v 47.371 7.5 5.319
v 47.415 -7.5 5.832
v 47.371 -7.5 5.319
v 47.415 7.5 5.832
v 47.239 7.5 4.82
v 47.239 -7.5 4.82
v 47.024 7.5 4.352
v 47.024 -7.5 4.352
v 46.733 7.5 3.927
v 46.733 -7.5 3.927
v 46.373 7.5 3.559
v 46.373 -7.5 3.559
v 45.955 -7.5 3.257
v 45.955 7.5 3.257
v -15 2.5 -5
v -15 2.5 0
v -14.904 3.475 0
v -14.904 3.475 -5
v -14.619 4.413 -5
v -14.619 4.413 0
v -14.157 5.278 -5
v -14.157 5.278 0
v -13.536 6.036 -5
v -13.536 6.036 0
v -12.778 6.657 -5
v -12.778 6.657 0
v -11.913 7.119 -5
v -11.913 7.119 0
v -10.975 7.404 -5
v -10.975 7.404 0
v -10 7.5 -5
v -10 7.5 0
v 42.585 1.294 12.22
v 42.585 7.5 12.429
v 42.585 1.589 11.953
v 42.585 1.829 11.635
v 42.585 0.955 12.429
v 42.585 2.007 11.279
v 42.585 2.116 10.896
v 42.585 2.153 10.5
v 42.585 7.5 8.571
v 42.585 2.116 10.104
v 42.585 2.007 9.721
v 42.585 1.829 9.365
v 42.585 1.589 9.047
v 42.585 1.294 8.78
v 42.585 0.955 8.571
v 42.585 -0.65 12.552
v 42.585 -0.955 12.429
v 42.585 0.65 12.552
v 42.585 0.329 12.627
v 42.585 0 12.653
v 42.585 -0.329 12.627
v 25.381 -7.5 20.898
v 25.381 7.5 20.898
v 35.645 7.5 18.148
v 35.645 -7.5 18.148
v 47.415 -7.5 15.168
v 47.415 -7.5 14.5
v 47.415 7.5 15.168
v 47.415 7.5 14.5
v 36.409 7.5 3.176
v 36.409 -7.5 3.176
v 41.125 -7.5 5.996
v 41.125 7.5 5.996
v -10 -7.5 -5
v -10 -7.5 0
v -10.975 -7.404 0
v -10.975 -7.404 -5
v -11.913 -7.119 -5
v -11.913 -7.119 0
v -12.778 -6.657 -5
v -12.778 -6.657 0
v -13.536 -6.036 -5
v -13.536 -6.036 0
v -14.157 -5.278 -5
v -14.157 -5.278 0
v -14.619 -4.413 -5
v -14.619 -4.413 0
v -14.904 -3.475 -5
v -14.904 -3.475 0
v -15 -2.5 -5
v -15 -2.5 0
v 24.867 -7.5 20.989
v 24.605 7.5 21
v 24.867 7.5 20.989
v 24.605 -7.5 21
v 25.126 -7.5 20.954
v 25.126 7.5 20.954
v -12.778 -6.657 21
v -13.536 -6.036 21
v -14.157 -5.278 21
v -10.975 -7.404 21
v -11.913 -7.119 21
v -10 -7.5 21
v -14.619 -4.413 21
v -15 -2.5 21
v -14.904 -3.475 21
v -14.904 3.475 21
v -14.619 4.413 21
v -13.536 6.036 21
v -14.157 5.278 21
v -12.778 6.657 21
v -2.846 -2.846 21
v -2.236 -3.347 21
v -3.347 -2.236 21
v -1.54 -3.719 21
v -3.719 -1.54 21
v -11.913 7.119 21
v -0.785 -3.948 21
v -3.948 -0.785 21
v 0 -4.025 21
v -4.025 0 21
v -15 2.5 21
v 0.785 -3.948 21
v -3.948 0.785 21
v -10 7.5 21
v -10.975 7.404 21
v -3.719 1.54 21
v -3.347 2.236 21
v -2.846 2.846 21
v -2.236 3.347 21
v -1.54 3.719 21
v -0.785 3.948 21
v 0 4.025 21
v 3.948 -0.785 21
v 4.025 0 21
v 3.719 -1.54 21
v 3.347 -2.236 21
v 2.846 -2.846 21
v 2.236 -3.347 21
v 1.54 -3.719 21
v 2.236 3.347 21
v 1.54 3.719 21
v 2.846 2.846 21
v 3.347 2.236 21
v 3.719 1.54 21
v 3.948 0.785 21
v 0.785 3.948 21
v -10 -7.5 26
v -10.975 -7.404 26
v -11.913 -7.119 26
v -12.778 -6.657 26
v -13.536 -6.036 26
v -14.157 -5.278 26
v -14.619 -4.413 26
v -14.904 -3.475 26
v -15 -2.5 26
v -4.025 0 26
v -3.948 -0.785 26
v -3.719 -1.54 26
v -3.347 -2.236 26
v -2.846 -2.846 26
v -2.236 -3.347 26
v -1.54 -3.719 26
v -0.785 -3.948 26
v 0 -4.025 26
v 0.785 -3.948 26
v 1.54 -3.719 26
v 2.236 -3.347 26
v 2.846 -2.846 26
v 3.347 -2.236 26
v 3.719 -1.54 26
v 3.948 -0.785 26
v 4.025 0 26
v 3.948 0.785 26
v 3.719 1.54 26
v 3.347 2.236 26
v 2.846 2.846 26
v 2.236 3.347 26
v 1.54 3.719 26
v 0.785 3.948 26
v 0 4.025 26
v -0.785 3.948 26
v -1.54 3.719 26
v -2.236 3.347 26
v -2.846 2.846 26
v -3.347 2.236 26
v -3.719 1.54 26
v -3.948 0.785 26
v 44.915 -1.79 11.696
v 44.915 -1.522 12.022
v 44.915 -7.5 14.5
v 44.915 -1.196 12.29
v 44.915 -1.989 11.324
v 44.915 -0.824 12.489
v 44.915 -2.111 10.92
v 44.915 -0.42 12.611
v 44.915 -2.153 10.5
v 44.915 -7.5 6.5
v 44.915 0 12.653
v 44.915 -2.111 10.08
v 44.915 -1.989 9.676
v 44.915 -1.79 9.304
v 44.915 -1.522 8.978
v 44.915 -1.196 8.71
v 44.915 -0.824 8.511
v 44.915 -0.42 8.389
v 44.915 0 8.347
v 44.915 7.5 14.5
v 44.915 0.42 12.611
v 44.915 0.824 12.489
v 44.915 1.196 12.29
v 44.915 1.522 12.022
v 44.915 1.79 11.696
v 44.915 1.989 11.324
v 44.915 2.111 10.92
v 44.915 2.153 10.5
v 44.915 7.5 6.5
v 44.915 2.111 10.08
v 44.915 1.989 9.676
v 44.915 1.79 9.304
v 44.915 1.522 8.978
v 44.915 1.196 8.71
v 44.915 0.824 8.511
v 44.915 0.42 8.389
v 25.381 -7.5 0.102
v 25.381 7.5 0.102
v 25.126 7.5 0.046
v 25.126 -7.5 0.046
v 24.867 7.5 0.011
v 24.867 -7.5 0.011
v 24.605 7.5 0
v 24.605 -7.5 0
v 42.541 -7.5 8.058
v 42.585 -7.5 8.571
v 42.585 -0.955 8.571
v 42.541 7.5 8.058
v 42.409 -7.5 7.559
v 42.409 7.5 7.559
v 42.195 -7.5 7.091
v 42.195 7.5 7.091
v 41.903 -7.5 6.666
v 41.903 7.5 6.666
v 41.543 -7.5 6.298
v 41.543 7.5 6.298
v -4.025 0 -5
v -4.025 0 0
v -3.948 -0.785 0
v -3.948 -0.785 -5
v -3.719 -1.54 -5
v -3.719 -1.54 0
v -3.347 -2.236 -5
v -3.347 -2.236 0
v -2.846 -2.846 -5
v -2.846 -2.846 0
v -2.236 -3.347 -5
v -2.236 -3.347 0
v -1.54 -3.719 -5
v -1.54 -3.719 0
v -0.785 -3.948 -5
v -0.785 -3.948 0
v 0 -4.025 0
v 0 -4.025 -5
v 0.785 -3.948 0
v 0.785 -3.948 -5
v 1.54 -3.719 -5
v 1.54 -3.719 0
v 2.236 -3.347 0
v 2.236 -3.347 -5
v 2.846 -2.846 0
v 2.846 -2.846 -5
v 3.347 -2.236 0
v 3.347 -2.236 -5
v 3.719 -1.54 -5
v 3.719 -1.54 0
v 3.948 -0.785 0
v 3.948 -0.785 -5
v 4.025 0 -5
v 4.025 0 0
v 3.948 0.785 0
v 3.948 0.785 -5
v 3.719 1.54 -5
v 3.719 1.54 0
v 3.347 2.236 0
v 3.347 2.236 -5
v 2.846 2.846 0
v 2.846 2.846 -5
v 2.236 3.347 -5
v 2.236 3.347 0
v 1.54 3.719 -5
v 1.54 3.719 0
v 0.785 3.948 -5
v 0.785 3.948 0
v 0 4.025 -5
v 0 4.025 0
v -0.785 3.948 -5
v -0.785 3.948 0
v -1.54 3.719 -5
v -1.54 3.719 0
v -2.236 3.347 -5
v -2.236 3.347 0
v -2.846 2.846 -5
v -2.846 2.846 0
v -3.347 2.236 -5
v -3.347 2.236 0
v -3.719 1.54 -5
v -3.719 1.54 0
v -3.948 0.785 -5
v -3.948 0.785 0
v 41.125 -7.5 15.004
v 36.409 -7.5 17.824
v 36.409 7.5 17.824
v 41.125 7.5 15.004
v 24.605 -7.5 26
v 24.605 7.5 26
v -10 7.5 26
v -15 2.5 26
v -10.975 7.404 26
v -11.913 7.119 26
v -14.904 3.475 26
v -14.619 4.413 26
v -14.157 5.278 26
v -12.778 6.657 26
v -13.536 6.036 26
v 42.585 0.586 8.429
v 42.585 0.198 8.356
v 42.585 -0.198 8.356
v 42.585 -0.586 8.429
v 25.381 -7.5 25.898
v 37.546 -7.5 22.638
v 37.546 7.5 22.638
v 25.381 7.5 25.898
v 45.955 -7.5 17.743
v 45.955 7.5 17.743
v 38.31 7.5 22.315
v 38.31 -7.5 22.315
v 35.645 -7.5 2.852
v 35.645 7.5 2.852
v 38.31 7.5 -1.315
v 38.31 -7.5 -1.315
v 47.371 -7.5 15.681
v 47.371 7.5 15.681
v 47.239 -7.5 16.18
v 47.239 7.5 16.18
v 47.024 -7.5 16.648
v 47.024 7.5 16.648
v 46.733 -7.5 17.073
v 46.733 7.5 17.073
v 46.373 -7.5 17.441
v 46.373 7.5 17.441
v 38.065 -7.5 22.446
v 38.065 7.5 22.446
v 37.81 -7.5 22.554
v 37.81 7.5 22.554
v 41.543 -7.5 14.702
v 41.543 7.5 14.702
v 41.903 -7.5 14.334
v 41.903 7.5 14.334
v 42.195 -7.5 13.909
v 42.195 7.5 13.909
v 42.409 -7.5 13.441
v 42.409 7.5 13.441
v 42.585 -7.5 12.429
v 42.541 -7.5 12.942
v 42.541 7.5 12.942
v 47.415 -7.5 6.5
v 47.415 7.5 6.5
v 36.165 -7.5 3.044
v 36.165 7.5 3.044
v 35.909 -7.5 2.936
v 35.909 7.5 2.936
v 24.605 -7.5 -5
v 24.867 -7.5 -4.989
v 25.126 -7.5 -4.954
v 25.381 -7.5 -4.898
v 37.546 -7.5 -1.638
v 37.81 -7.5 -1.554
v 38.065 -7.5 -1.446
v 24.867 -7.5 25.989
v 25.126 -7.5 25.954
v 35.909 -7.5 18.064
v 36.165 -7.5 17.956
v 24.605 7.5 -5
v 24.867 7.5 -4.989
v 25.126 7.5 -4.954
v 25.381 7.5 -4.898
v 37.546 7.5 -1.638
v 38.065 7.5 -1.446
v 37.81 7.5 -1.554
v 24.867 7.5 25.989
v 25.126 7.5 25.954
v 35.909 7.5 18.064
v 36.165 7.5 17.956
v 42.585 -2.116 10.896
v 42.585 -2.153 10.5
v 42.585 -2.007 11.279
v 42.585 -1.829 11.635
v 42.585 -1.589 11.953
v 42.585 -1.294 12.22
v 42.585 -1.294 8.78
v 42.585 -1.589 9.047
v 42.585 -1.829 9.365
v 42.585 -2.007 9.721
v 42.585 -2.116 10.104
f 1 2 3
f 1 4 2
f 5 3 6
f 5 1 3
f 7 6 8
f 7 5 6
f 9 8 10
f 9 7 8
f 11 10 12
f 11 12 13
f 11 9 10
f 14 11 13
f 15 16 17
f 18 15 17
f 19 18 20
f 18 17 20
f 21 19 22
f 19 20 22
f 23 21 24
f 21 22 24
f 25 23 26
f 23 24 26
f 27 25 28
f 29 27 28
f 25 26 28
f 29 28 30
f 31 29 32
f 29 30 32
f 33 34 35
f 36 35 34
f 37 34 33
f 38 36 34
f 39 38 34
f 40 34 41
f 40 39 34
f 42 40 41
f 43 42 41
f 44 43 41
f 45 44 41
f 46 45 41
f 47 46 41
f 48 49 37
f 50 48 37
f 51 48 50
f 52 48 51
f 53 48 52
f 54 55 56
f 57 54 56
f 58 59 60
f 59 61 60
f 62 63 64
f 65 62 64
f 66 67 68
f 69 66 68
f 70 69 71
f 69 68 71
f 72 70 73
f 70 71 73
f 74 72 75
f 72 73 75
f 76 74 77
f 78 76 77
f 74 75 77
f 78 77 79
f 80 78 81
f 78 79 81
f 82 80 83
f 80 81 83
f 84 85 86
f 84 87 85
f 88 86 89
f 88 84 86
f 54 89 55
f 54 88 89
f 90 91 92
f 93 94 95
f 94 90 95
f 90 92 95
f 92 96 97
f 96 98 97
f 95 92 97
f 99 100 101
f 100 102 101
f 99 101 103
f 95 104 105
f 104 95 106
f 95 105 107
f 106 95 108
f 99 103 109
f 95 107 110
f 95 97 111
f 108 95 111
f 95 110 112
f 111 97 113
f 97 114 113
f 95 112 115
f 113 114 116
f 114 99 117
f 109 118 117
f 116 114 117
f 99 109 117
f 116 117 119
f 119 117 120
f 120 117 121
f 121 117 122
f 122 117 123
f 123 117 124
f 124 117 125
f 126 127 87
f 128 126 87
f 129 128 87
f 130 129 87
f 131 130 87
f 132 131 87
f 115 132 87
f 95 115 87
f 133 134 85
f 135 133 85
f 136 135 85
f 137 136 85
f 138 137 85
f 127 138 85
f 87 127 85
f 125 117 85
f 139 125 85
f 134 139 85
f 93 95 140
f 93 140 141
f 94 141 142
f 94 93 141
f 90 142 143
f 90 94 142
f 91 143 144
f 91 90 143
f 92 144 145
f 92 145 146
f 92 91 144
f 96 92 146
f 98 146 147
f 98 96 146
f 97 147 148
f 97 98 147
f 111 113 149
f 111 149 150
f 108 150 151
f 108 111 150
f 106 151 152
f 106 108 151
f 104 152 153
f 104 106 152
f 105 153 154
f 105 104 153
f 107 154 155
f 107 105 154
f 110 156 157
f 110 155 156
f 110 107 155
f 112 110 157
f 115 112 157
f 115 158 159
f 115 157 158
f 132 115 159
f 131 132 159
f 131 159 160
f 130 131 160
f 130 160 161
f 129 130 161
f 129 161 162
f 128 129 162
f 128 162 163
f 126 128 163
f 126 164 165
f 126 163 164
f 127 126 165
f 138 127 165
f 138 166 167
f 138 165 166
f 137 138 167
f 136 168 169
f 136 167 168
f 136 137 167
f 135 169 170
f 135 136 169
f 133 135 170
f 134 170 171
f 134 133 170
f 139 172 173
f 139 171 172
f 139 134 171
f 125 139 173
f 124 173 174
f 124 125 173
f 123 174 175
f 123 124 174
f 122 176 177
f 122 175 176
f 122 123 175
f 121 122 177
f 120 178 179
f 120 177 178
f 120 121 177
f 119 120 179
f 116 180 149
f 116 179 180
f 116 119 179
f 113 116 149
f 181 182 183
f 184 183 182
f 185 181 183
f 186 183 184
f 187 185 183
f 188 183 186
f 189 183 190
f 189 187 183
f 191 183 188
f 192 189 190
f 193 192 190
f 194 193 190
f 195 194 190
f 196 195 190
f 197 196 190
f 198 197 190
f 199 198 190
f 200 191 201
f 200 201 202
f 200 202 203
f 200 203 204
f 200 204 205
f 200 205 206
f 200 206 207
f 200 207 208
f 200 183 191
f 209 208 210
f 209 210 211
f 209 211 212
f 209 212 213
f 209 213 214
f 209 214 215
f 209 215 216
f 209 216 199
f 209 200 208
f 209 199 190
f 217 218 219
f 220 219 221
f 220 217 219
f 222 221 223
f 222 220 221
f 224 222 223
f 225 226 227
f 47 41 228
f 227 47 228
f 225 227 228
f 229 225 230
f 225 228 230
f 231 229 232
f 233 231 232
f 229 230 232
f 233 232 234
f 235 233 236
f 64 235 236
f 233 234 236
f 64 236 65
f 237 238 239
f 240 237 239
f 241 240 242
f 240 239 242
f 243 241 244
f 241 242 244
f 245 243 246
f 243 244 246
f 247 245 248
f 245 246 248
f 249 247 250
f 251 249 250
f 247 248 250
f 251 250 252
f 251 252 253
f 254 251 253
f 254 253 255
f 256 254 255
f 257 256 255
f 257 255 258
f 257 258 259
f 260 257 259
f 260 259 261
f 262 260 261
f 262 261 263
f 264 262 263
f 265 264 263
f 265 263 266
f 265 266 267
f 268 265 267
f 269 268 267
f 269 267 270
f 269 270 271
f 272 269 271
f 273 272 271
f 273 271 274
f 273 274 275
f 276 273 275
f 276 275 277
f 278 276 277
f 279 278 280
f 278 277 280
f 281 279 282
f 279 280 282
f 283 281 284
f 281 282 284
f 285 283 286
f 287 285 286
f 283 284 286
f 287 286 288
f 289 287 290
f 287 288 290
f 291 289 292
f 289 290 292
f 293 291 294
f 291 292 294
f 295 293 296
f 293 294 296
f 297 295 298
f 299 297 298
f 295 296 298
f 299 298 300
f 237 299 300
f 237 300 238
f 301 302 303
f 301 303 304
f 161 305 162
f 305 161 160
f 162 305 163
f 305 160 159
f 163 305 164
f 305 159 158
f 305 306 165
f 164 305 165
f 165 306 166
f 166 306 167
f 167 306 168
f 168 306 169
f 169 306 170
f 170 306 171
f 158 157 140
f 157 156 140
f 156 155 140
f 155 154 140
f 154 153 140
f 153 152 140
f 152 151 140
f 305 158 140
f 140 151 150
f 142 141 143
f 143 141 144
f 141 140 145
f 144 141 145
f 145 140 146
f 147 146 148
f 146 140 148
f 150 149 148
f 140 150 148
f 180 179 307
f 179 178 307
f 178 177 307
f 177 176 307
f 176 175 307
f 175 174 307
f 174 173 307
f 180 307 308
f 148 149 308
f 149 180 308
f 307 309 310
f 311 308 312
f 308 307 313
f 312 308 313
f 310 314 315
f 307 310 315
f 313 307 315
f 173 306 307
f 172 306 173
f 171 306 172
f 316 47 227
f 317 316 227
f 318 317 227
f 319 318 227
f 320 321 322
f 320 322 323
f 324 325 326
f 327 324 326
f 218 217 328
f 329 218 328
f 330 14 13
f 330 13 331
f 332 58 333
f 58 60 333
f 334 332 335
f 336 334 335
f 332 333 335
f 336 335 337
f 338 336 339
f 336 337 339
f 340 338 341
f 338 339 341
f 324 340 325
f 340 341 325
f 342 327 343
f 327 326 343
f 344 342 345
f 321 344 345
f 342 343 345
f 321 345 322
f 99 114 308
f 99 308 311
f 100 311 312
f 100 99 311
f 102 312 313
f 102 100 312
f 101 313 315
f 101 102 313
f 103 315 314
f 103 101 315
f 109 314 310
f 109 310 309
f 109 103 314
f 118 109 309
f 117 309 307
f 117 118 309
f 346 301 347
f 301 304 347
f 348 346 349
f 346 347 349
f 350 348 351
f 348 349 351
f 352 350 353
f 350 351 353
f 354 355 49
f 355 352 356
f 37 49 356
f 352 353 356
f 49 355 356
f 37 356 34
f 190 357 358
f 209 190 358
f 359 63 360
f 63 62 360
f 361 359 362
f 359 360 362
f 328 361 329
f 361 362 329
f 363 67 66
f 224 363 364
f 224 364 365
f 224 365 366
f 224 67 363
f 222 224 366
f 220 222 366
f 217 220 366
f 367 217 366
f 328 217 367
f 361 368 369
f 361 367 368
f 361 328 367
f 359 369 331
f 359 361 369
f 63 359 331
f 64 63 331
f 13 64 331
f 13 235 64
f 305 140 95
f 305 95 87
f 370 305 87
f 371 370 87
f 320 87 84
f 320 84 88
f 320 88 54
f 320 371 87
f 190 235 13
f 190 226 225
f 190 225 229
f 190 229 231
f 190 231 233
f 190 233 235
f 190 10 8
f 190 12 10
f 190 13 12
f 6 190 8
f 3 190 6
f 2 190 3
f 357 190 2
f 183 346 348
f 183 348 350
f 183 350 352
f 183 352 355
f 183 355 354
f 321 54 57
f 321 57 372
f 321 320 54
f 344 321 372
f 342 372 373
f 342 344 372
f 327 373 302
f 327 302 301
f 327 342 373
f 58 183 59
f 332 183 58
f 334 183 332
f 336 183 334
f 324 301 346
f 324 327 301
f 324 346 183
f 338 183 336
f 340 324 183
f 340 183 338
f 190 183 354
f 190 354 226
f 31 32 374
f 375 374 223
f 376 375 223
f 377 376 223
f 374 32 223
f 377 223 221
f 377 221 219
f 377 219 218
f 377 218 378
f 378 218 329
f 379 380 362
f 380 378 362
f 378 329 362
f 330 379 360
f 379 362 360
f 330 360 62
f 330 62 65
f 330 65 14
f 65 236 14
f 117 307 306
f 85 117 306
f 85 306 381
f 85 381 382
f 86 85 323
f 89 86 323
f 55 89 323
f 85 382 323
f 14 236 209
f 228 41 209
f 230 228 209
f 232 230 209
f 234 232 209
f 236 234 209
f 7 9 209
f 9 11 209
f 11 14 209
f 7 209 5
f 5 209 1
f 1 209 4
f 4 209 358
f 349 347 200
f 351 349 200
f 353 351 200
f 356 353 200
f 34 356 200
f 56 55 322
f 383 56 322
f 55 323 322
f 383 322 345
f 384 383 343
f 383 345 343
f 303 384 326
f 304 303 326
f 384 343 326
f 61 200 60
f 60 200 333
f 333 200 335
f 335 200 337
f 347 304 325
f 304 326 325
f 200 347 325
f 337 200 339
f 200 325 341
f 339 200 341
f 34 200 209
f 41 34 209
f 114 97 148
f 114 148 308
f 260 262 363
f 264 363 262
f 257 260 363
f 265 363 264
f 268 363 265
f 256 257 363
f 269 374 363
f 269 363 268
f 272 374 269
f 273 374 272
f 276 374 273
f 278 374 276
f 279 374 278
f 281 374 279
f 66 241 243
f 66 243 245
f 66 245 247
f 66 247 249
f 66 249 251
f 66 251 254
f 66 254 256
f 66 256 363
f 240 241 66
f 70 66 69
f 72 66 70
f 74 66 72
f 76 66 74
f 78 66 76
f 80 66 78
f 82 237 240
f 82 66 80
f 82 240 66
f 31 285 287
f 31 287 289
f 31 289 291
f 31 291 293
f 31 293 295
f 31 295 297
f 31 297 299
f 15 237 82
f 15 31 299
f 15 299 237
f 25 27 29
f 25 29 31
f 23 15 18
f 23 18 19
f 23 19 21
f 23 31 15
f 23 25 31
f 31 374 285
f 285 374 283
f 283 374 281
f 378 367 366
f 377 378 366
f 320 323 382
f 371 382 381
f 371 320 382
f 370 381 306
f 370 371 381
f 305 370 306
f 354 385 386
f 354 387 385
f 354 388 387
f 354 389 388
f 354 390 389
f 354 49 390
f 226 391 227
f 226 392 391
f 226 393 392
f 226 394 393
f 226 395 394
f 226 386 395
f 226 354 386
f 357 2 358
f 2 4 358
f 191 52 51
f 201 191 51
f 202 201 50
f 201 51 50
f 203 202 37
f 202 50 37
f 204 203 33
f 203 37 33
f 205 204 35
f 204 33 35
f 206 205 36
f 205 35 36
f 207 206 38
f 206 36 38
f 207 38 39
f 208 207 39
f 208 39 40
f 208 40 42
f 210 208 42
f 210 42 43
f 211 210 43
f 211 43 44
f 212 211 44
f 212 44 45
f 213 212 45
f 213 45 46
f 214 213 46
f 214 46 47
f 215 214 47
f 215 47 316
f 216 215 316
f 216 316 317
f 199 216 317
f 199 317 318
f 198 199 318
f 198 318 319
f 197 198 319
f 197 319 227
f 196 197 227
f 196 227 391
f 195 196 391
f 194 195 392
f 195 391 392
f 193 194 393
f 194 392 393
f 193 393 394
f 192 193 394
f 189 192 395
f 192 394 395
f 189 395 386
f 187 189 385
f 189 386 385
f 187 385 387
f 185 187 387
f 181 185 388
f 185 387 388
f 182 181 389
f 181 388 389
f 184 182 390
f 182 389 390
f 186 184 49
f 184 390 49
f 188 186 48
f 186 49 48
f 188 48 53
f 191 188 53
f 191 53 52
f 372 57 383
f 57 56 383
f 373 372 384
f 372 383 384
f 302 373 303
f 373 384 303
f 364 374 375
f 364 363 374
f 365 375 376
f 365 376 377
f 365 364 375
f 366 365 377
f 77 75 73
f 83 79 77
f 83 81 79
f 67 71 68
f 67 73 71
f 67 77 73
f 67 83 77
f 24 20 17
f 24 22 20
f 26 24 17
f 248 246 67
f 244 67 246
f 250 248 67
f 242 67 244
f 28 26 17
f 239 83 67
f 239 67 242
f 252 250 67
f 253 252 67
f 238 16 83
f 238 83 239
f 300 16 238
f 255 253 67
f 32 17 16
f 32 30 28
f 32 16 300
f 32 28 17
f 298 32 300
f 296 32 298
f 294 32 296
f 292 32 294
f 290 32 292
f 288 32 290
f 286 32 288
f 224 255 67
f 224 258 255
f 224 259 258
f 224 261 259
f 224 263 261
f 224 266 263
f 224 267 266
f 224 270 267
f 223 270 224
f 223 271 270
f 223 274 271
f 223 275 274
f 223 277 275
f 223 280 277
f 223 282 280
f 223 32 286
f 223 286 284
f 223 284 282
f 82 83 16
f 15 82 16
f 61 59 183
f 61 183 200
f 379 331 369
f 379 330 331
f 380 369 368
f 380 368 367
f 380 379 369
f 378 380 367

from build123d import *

# Parameters (mm, degrees)
SHAPE_BASE_R                   = 4.025
BOSS_EXTRUDE1_DEPTH            = 5
SWEEP2_START                   = -7.5
SWEEP2_DEPTH                   = 15
CUT_EXTRUDE2_REACH             = 52.965
BOSS_EXTRUDE2_DEPTH            = 15
CUT_EXTRUDE3_REACH             = 56.593
SKETCH4_10_R                   = 4.025
CUT_EXTRUDE3_DIRECTION_2_DEPTH = 55.593173935
FILLET1_R                      = 3
SKETCH21_W                     = 8
SKETCH21_H                     = 15
CUT_EXTRUDE4_DEPTH             = 2.5
F_6_CLEARANCE_HOLE1_D          = 4.3053
F_6_CLEARANCE_HOLE1_DEPTH      = 2.329629131


# Read off the part's stored shape, not the designer's step: Sweep2
with BuildPart() as part:
    # Shape - base → Boss-Extrude1 (new body)
    # profile 1 of 2: a face of its own
    with BuildSketch(Plane.XY):
        with BuildLine():
            Line((-10, 7.5), (25, 7.5))
            Line((25, 7.5), (25, -7.5))
            Line((25, -7.5), (-10, -7.5))
            ThreePointArc((-10, -7.5), (-13.535533906, -6.035533906), (-15, -2.5))
            Line((-15, -2.5), (-15, 2.5))
            ThreePointArc((-15, 2.5), (-13.535533906, 6.035533906), (-10, 7.5))
        make_face()
        Circle(SHAPE_BASE_R, mode=Mode.SUBTRACT)
    # profile 2 of 2: a face of its own
    with BuildSketch(Plane.XY):
        Circle(SHAPE_BASE_R)
    extrude(amount=-BOSS_EXTRUDE1_DEPTH)

    # Sweep2 outline → Sweep2 (add)
    with BuildSketch(Plane(origin=(0, 0, 0), x_dir=(1, 0, 0), z_dir=(0, 1, 0)).offset(SWEEP2_START)):
        Polygon((42.585185434, -6.869503049), (42.585185434, -11.147047613), (47.414814566, -9.852952387), (47.414814566, -4.130496951), (37.95038024, 1.529956073), (25, 5), (25, 0), (36.04961976, -2.960736691), align=None)
    extrude(amount=SWEEP2_DEPTH)

    # Sketch18 → Cut-Extrude2 (cut, up to next)
    with BuildSketch(Plane(origin=(0, 7.5, 0), x_dir=(1, 0, 0), z_dir=(0, 1, 0)), mode=Mode.PRIVATE) as cut_extrude2_sk1:
        Polygon((42.585185434, -11.147047613), (45, -10.5), (42.585185434, -10.5), align=None)
    cut_extrude2_tool1 = extrude(cut_extrude2_sk1.sketch, amount=-CUT_EXTRUDE2_REACH, mode=Mode.PRIVATE) & part.part
    add(cut_extrude2_tool1.solids().sort_by_distance((43.390124, 7.5, 10.715683))[0], mode=Mode.SUBTRACT)

    # Sketch18<3> → Boss-Extrude2 (add, through all)
    with BuildSketch(Plane(origin=(0, 7.5, 0), x_dir=(1, 0, 0), z_dir=(0, 1, 0))):
        Polygon((47.414814566, -10.5), (47.414814566, -9.852952387), (45, -10.5), align=None)
    extrude(amount=-BOSS_EXTRUDE2_DEPTH)

    # Mirror1: part across face


with BuildPart() as part_1:
    add(part.part)
    add(part.part.mirror(Plane(origin=(45, 0, 10.5), x_dir=(1, 0, 0), z_dir=(0, 0, 1))))

    # Sketch4<10> → Cut-Extrude3 (cut, up to next)
    with BuildSketch(Plane.XY, mode=Mode.PRIVATE) as cut_extrude3_sk1:
        with Locations(Location((0, 0, 0), (0, 0, 180))):
            Circle(SKETCH4_10_R)
    cut_extrude3_tool1 = extrude(cut_extrude3_sk1.sketch, amount=-CUT_EXTRUDE3_REACH, mode=Mode.PRIVATE) & part_1.part
    add(cut_extrude3_tool1.solids().sort_by_distance((0, 0, 0))[0], mode=Mode.SUBTRACT)

    # Sketch4<10> → Cut-Extrude3 direction 2 (cut)
    with BuildSketch(Plane.XY):
        with Locations(Location((0, 0, 0), (0, 0, 180))):
            Circle(SKETCH4_10_R)
    extrude(amount=CUT_EXTRUDE3_DIRECTION_2_DEPTH, mode=Mode.SUBTRACT)

    # Fillet1
    fillet1_edges = [part_1.edges().sort_by_distance(p)[0] for p in [
        (47.414814566, 0, 4.130496951),
        (42.585185434, 0, 6.869503049),
        (37.95038024, 0, -1.529956073),
        (36.04961976, 0, 2.960736691),
        (25, 0, -5),
        (25, 0, 0),
        (25, 0, 21),
        (42.585185434, 0, 14.130496951),
        (47.414814566, 0, 16.869503049),
        (37.95038024, 0, 22.529956073),
        (36.04961976, 0, 18.039263309),
        (25, 0, 26),
    ]]
    fillet(fillet1_edges, radius=FILLET1_R)

    # Sketch21 → Cut-Extrude4 (cut)
    with BuildSketch(Plane(origin=(47.414814566, 0, 0), x_dir=(0, 0, -1), z_dir=(1, 0, 0))):
        with Locations((-10.5, 0)):
            Rectangle(SKETCH21_W, SKETCH21_H)
    extrude(amount=-CUT_EXTRUDE4_DEPTH, mode=Mode.SUBTRACT)

    # #6 Clearance Hole1
    with Locations(Plane(origin=(44.914814566, 0, 0), x_dir=(0, 0, -1), z_dir=(1, 0, 0))):
        with Locations((-10.5, 0)):
            Hole(F_6_CLEARANCE_HOLE1_D / 2, depth=F_6_CLEARANCE_HOLE1_DEPTH)


solid = part_1.part
